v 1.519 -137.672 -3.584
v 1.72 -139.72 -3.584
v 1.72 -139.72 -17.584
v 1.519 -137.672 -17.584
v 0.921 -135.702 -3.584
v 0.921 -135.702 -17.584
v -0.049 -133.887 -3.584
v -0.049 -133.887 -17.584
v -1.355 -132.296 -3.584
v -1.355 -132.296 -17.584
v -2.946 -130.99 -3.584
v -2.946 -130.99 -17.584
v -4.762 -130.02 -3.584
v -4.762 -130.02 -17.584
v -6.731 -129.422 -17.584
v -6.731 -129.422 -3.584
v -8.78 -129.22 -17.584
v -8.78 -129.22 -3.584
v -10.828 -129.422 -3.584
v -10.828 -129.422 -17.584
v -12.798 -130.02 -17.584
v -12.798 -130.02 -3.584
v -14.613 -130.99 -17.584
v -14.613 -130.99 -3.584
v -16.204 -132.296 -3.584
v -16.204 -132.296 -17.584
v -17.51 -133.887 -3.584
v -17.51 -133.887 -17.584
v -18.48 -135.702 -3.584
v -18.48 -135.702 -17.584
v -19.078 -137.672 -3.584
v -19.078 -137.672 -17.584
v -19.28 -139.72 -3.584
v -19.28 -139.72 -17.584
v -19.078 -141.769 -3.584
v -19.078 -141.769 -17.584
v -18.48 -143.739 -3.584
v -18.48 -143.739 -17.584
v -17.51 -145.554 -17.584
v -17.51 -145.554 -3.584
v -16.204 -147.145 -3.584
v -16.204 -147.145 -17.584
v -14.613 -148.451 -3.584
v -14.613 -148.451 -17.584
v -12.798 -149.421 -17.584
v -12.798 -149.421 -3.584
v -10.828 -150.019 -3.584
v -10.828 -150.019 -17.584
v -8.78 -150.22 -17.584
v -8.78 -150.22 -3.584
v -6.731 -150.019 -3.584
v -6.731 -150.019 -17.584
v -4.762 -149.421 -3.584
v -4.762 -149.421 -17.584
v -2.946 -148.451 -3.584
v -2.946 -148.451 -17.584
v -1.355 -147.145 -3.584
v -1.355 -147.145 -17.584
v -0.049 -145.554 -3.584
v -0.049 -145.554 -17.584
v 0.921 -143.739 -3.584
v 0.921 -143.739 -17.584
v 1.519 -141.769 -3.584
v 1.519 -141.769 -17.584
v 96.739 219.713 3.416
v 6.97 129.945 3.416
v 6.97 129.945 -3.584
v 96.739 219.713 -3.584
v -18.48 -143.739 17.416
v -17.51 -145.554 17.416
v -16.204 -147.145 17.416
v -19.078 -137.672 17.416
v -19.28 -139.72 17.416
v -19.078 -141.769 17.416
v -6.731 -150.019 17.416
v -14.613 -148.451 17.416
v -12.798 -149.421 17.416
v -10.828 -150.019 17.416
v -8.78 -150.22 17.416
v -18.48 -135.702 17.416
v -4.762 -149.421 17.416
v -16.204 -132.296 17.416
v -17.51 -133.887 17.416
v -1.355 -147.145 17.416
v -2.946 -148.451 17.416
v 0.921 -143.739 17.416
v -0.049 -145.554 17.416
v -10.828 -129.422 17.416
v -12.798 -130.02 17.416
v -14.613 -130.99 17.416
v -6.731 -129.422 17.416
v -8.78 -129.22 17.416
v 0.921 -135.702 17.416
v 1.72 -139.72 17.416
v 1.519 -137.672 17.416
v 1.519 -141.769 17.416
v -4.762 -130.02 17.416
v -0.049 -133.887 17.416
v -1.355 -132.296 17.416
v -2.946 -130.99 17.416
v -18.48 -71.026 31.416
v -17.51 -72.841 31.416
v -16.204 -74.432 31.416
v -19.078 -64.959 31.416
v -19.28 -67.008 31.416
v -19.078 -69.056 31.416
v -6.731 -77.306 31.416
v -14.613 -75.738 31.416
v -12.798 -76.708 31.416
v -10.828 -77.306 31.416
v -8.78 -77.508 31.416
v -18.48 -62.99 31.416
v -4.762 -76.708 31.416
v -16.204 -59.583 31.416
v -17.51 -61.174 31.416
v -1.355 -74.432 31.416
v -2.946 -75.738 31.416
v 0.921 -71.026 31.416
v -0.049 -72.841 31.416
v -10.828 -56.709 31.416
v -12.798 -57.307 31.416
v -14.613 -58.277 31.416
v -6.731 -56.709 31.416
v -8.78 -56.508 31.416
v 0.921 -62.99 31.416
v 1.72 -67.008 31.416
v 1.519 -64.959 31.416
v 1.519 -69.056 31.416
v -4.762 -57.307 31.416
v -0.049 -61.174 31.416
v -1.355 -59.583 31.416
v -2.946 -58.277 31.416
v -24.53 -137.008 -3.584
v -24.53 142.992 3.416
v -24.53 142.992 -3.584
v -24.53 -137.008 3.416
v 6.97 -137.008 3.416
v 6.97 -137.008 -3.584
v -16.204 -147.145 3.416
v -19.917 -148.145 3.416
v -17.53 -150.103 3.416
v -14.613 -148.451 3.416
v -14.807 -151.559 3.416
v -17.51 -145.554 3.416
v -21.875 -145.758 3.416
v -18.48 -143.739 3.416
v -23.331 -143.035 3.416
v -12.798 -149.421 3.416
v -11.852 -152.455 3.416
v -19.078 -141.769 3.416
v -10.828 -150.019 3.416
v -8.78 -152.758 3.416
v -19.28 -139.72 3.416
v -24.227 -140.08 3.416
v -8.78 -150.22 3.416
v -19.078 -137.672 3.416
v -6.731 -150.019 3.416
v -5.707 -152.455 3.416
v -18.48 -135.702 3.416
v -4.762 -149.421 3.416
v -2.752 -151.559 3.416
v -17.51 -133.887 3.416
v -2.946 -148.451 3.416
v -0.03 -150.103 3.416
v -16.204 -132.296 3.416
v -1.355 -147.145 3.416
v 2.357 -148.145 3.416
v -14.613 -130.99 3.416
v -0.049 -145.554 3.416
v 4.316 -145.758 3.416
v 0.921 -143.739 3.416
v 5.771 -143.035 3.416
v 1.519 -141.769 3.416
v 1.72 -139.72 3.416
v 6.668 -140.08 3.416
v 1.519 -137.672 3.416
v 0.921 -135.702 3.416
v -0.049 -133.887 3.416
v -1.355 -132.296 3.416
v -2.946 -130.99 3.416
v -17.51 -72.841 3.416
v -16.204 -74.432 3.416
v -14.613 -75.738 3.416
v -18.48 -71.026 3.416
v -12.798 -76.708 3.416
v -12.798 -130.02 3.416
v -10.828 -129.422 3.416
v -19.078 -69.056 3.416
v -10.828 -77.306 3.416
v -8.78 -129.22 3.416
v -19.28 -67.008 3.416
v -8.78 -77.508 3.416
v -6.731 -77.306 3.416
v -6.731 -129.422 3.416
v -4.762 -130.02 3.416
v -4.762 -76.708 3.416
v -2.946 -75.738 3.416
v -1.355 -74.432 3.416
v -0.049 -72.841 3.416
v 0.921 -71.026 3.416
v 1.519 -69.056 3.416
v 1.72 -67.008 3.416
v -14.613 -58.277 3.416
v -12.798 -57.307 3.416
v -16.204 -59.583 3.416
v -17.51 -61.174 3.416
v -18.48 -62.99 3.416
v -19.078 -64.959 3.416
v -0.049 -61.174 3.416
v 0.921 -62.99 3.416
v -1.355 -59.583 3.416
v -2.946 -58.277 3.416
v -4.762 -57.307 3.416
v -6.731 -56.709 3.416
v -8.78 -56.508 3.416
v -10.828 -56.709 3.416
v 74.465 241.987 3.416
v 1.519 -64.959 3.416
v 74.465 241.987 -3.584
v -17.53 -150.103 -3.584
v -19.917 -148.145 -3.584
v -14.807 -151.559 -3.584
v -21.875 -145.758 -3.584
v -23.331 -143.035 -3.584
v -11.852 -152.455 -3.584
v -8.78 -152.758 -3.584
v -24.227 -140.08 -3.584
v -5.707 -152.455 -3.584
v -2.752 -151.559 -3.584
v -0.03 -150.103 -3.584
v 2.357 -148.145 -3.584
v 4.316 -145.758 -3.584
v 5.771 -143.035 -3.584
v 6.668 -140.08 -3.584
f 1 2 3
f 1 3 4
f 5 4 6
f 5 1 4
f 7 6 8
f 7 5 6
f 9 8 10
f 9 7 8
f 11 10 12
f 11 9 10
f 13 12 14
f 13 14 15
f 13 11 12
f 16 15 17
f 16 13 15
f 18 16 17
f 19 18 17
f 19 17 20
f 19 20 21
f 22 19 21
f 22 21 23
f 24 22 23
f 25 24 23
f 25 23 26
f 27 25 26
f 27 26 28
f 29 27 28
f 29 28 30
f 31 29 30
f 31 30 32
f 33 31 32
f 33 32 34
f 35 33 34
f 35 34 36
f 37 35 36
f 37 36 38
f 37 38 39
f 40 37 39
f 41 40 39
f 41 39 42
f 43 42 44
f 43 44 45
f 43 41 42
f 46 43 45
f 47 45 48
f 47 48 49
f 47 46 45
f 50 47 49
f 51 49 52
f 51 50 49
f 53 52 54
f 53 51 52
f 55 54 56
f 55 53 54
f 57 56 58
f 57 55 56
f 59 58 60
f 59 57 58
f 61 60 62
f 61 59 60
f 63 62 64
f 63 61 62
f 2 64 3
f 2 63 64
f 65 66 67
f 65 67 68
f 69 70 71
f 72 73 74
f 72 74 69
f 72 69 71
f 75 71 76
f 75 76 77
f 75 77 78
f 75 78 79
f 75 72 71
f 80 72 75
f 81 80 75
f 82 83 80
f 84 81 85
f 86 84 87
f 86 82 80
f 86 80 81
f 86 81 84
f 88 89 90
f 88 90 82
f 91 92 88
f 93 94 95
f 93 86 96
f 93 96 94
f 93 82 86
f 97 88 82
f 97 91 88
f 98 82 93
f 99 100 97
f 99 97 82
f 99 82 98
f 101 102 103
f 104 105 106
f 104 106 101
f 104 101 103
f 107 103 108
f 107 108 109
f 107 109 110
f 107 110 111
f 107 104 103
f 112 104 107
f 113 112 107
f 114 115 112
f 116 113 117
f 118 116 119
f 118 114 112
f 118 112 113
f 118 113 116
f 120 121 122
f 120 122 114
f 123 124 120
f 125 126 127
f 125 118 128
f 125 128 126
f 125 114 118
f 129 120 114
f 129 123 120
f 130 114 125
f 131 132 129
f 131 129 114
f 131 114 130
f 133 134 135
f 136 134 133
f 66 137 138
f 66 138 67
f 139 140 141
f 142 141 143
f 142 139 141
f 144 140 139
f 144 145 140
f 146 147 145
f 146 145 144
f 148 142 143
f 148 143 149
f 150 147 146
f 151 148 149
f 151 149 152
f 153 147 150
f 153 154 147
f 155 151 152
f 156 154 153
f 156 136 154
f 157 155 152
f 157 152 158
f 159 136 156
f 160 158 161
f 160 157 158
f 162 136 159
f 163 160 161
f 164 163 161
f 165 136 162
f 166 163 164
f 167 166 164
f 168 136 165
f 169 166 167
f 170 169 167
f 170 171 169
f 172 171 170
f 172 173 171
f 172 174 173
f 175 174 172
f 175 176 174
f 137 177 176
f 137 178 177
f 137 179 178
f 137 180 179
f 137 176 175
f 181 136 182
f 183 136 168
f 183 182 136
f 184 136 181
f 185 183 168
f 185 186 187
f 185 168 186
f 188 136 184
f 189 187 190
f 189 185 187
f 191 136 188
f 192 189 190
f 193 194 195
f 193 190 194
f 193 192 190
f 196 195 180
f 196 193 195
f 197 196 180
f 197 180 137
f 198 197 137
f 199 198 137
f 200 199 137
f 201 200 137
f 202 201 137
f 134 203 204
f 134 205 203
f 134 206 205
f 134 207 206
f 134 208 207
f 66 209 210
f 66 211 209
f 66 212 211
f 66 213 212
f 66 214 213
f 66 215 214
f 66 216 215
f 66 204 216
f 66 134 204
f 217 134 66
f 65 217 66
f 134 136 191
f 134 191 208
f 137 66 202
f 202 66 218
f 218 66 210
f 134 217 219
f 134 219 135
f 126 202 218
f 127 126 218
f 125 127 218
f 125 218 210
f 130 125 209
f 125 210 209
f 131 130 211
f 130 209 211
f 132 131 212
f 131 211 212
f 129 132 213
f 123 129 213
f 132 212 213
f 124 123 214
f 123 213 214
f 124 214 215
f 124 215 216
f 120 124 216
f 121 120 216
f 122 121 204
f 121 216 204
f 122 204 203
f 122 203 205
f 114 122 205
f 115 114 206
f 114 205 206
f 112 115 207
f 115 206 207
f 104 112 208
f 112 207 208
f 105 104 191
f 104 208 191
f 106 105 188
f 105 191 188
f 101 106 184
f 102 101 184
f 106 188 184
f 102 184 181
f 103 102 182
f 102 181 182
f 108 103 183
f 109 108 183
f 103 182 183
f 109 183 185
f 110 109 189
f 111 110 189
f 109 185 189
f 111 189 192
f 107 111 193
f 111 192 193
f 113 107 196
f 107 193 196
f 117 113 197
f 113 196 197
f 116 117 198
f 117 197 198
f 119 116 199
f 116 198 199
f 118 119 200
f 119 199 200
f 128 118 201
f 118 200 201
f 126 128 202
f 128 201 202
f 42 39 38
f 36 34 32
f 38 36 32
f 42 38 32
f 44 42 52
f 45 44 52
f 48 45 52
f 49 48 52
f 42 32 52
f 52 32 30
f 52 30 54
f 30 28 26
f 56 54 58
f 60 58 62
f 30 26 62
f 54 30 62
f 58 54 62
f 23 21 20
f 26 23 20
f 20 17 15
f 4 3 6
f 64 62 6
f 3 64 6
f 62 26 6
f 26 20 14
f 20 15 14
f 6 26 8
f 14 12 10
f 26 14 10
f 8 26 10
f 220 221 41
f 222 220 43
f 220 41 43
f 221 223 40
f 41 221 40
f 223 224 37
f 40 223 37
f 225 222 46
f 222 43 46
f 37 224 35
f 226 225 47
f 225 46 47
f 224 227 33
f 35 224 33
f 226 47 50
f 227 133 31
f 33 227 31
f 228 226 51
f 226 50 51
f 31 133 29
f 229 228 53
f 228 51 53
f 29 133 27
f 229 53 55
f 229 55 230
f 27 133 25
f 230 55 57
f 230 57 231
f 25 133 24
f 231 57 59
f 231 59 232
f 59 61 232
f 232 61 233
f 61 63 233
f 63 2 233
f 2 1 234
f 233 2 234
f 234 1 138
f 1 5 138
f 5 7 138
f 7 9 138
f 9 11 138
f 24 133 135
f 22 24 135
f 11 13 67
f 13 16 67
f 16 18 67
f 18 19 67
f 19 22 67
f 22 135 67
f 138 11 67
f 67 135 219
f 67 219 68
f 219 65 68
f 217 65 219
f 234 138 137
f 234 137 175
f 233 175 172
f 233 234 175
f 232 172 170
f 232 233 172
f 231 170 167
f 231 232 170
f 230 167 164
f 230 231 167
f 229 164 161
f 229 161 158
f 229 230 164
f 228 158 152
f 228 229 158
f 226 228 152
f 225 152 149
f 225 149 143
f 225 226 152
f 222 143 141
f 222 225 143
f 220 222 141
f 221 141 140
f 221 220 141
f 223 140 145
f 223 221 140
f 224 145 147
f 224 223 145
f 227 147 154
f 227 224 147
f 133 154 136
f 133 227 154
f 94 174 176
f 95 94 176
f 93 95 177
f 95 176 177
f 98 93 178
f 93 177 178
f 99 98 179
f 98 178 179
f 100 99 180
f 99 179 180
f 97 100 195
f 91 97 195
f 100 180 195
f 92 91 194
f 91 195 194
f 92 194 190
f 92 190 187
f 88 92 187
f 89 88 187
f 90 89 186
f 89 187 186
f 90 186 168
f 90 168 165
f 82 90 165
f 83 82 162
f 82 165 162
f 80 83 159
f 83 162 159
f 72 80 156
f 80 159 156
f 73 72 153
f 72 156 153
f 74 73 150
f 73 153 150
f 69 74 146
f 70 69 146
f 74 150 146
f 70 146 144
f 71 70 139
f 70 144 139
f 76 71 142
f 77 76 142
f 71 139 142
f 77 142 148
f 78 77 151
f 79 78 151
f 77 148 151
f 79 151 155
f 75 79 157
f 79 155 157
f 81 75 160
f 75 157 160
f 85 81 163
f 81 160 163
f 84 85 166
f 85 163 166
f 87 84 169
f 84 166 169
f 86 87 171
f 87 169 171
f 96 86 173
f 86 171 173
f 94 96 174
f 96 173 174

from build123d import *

# Parameters (mm, degrees)
EXTRUDE_1_DEPTH      = 2
SKETCH_2_R           = 3
EXTRUDE_2_DEPTH      = 8
SKETCH_3_R           = 3
EXTRUDE_3_DEPTH      = 4
EXTRUDE_3_DEPTH_BACK = 6
EXTRUDE_4_DEPTH      = 2
SCALE_3_SCALE        = 3.5


with BuildPart() as part:
    # 草图1 → 凸台-拉伸1 (new body)
    with BuildSketch(Plane.XY):
        with BuildLine():
            Line((-4.5, -20), (-4.5, 20))
            ThreePointArc((-4.5, 20), (0, 24.5), (4.5, 20))
            Line((4.5, 20), (4.5, -20))
            ThreePointArc((4.5, -20), (0, -24.5), (-4.5, -20))
        make_face()
    extrude(amount=EXTRUDE_1_DEPTH)

    # 草图2 → 凸台-拉伸2 (add)
    with BuildSketch(Plane.XY.offset(2)):
        Circle(SKETCH_2_R)
    extrude(amount=EXTRUDE_2_DEPTH)

    # 草图3 → 凸台-拉伸3 (add, two sides)
    with BuildSketch(Plane.XY.offset(2)) as extrude_3_sk:
        with Locations((0, -20.775035614)):
            Circle(SKETCH_3_R)
    extrude(amount=EXTRUDE_3_DEPTH)
    extrude(extrude_3_sk.sketch, amount=-EXTRUDE_3_DEPTH_BACK)

    # 草图4 → 凸台-拉伸4 (add)
    with BuildSketch(Plane.XY.offset(2)):
        Polygon((-4.5, 60), (-4.5, 20), (4.5, 20), (4.5, 56.272077939), (30.148232278, 81.920310217), (23.784271247, 88.284271247), align=None)
    extrude(amount=-EXTRUDE_4_DEPTH)


with BuildPart() as part_1:
    # 缩放比例3: scaled about (3.511892573, 26.803081313, 1.433505164)
    add(part.part.scale(SCALE_3_SCALE).moved(Location((-8.779731433, -67.007703283, -3.58376291))))


solid = part_1.part
